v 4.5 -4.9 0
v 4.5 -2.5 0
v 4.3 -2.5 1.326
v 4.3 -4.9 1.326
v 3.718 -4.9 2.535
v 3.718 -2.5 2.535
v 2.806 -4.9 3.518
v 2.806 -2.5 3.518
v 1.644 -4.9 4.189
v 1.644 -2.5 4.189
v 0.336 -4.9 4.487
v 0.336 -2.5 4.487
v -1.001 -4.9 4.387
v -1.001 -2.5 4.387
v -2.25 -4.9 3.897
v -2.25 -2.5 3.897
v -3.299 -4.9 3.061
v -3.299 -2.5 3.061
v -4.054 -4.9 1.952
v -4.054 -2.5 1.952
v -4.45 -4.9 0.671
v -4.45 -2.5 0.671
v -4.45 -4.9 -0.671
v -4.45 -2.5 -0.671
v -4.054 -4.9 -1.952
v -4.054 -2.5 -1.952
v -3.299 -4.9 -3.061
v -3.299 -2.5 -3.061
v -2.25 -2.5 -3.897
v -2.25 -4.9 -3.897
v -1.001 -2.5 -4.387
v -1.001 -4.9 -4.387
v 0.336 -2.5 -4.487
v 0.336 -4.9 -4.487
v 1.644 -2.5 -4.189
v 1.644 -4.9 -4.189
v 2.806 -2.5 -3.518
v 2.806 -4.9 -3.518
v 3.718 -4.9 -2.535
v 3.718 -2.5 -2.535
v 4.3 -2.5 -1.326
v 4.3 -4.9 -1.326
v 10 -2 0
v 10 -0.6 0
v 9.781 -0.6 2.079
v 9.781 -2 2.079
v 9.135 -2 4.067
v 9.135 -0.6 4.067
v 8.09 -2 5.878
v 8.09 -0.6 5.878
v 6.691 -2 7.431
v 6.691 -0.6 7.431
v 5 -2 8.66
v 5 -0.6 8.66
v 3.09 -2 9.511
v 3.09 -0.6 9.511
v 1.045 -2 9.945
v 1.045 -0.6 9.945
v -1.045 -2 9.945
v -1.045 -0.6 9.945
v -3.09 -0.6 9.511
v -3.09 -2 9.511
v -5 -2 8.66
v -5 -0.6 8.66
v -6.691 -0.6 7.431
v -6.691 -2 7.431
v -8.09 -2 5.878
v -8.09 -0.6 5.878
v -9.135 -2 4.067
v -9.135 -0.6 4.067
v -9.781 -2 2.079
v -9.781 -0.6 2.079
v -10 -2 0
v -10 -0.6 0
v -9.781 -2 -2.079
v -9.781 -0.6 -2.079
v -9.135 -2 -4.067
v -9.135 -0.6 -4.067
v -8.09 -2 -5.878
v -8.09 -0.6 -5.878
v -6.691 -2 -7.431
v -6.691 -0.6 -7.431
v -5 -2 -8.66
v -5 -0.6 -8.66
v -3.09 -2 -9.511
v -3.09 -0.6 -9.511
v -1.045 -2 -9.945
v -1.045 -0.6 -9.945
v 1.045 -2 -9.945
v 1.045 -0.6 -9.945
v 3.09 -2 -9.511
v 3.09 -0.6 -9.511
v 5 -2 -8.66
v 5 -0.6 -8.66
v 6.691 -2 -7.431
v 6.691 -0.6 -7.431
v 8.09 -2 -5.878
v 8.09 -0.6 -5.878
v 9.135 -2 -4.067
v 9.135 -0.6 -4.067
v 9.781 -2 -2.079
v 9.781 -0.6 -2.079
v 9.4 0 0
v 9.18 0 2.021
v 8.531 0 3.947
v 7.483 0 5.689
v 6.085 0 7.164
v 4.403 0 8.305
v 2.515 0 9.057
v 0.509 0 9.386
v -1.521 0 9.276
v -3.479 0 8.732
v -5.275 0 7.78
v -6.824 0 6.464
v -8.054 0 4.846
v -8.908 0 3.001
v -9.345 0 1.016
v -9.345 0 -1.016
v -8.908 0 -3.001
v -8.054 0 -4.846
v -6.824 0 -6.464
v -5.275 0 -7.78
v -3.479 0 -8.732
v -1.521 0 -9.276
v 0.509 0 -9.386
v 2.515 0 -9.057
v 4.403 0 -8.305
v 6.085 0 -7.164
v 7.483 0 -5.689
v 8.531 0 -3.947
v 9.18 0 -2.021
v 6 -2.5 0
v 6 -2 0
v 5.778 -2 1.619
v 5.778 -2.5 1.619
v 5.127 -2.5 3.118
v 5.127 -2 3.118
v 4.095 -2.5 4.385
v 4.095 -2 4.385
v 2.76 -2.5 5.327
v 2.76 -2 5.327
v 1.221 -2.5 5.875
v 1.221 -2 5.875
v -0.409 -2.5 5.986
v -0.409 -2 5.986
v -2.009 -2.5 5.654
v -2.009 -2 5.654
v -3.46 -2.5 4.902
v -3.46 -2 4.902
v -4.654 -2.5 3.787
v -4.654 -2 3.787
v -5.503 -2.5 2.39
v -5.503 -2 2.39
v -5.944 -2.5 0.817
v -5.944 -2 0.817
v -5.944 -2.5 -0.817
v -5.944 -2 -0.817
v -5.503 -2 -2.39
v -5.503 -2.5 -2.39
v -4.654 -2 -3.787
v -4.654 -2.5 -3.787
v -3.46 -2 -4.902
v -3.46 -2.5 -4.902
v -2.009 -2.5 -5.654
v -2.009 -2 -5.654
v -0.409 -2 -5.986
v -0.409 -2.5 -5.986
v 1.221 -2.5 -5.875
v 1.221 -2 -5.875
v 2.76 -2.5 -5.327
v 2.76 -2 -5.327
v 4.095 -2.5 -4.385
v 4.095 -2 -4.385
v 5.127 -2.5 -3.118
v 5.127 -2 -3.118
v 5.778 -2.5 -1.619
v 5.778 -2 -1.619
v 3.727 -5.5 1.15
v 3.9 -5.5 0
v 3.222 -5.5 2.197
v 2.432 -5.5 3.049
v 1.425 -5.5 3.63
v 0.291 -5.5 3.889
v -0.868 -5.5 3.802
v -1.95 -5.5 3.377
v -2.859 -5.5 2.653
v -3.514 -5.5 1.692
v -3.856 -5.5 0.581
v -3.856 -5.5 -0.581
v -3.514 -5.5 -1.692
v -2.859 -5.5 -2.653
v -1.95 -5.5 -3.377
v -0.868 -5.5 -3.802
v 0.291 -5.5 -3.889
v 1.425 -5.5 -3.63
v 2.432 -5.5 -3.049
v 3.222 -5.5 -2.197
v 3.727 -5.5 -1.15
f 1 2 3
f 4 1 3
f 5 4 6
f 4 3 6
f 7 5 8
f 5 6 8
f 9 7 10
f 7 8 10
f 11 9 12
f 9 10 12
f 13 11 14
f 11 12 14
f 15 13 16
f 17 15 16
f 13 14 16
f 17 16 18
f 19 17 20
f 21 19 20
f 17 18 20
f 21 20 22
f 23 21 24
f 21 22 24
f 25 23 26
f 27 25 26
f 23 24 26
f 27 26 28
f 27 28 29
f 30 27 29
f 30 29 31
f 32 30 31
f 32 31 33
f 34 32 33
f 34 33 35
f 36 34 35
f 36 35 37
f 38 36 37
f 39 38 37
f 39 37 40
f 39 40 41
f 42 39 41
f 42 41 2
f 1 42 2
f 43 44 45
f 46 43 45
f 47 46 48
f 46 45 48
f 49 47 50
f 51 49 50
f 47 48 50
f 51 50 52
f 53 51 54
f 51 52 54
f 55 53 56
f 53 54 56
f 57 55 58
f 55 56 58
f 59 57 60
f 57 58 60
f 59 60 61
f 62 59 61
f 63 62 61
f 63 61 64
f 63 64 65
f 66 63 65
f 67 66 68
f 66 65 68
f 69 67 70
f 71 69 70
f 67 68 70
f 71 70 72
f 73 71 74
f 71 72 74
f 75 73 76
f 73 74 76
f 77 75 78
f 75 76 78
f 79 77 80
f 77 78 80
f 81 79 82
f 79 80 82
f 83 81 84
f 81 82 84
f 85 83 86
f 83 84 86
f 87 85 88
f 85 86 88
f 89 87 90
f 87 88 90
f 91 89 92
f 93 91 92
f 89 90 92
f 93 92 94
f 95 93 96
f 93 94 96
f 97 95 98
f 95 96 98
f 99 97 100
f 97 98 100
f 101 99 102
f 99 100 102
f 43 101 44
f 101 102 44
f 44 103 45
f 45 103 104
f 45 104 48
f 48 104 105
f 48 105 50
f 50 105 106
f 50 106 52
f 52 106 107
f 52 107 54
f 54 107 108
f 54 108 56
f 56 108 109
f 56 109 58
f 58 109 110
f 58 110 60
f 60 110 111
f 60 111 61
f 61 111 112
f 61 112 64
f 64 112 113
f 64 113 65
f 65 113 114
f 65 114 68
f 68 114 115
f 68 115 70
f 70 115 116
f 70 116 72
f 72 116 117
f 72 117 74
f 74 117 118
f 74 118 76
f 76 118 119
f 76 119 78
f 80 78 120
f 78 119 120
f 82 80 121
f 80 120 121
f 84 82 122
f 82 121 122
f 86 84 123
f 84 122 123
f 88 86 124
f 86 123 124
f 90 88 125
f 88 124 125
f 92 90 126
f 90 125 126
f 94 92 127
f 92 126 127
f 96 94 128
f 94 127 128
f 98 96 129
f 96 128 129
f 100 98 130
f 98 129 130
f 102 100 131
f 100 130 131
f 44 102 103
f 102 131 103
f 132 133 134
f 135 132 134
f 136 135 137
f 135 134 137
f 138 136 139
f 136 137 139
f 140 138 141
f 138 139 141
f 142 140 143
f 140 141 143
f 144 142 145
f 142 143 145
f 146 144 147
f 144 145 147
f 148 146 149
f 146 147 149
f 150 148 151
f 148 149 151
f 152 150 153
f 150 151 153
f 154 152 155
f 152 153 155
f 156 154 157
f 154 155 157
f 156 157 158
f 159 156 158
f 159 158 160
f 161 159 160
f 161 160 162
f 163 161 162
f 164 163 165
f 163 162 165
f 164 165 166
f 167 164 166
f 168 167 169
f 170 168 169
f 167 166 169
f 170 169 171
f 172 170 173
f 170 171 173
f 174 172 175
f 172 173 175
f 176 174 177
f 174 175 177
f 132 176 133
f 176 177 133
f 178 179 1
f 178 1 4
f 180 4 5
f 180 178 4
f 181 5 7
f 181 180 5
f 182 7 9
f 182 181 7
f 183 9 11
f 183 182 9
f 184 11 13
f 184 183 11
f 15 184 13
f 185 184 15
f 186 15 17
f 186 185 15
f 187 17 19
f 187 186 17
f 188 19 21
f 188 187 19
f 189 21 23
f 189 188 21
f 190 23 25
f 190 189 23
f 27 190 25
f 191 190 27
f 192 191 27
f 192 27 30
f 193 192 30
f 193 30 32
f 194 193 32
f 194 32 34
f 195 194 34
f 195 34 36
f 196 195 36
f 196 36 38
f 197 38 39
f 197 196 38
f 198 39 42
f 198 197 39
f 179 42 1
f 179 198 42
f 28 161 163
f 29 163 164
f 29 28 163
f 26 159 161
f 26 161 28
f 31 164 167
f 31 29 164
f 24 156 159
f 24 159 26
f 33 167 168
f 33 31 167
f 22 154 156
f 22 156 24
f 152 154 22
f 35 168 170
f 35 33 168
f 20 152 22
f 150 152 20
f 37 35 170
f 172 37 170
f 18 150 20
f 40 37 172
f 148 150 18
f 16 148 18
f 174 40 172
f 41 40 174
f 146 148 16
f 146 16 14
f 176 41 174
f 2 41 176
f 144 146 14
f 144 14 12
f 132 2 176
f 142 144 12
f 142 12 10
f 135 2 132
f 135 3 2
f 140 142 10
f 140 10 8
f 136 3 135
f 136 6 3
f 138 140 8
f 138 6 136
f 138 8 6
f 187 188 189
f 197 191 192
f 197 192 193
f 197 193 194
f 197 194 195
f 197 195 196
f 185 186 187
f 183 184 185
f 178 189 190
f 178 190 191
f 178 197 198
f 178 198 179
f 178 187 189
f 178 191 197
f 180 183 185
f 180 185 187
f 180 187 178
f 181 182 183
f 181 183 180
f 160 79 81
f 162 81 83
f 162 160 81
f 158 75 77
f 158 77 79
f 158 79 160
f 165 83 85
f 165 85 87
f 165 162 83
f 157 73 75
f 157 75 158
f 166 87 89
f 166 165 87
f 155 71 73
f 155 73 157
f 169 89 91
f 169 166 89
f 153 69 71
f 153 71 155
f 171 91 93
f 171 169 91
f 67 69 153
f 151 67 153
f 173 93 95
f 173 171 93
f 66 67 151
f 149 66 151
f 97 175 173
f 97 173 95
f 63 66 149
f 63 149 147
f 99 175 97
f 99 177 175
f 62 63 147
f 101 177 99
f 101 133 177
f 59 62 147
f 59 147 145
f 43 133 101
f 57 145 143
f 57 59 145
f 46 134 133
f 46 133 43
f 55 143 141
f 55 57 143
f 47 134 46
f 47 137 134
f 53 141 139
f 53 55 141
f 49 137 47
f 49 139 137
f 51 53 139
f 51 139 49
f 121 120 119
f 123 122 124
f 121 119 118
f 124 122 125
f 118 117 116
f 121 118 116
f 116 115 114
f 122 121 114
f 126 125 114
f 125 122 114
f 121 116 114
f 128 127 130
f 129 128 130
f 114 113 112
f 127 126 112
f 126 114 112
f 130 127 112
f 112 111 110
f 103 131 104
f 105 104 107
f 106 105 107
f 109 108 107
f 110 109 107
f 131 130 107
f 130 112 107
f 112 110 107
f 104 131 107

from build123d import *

# Parameters (mm, degrees)
F0_R     = 10
F1_DEPTH = 2
F2_R     = 4.5
F3_DEPTH = 3.5
F5_R     = 6
F6_DEPTH = 0.5
F7_SIZE  = 0.6


with BuildPart() as f1:
    # F0 (on Front) → F1 (new body)
    with BuildSketch(Plane.XZ):
        Circle(F0_R)
    extrude(amount=F1_DEPTH)

    # F2 (on face) → F3 (join)
    with BuildSketch(Plane.XZ.offset(2)):
        Circle(F2_R)
    extrude(amount=F3_DEPTH)

    # F5 (on face) → F6 (join)
    with BuildSketch(Plane.XZ.offset(2)):
        Circle(F5_R)
    extrude(amount=F6_DEPTH)

    # F7
    f7_edges = [f1.edges().sort_by_distance(p)[0] for p in [
        (-10, 0, 0),
        (-4.5, -5.5, 0),
    ]]
    chamfer(f7_edges, length=F7_SIZE)


solid = f1.part
